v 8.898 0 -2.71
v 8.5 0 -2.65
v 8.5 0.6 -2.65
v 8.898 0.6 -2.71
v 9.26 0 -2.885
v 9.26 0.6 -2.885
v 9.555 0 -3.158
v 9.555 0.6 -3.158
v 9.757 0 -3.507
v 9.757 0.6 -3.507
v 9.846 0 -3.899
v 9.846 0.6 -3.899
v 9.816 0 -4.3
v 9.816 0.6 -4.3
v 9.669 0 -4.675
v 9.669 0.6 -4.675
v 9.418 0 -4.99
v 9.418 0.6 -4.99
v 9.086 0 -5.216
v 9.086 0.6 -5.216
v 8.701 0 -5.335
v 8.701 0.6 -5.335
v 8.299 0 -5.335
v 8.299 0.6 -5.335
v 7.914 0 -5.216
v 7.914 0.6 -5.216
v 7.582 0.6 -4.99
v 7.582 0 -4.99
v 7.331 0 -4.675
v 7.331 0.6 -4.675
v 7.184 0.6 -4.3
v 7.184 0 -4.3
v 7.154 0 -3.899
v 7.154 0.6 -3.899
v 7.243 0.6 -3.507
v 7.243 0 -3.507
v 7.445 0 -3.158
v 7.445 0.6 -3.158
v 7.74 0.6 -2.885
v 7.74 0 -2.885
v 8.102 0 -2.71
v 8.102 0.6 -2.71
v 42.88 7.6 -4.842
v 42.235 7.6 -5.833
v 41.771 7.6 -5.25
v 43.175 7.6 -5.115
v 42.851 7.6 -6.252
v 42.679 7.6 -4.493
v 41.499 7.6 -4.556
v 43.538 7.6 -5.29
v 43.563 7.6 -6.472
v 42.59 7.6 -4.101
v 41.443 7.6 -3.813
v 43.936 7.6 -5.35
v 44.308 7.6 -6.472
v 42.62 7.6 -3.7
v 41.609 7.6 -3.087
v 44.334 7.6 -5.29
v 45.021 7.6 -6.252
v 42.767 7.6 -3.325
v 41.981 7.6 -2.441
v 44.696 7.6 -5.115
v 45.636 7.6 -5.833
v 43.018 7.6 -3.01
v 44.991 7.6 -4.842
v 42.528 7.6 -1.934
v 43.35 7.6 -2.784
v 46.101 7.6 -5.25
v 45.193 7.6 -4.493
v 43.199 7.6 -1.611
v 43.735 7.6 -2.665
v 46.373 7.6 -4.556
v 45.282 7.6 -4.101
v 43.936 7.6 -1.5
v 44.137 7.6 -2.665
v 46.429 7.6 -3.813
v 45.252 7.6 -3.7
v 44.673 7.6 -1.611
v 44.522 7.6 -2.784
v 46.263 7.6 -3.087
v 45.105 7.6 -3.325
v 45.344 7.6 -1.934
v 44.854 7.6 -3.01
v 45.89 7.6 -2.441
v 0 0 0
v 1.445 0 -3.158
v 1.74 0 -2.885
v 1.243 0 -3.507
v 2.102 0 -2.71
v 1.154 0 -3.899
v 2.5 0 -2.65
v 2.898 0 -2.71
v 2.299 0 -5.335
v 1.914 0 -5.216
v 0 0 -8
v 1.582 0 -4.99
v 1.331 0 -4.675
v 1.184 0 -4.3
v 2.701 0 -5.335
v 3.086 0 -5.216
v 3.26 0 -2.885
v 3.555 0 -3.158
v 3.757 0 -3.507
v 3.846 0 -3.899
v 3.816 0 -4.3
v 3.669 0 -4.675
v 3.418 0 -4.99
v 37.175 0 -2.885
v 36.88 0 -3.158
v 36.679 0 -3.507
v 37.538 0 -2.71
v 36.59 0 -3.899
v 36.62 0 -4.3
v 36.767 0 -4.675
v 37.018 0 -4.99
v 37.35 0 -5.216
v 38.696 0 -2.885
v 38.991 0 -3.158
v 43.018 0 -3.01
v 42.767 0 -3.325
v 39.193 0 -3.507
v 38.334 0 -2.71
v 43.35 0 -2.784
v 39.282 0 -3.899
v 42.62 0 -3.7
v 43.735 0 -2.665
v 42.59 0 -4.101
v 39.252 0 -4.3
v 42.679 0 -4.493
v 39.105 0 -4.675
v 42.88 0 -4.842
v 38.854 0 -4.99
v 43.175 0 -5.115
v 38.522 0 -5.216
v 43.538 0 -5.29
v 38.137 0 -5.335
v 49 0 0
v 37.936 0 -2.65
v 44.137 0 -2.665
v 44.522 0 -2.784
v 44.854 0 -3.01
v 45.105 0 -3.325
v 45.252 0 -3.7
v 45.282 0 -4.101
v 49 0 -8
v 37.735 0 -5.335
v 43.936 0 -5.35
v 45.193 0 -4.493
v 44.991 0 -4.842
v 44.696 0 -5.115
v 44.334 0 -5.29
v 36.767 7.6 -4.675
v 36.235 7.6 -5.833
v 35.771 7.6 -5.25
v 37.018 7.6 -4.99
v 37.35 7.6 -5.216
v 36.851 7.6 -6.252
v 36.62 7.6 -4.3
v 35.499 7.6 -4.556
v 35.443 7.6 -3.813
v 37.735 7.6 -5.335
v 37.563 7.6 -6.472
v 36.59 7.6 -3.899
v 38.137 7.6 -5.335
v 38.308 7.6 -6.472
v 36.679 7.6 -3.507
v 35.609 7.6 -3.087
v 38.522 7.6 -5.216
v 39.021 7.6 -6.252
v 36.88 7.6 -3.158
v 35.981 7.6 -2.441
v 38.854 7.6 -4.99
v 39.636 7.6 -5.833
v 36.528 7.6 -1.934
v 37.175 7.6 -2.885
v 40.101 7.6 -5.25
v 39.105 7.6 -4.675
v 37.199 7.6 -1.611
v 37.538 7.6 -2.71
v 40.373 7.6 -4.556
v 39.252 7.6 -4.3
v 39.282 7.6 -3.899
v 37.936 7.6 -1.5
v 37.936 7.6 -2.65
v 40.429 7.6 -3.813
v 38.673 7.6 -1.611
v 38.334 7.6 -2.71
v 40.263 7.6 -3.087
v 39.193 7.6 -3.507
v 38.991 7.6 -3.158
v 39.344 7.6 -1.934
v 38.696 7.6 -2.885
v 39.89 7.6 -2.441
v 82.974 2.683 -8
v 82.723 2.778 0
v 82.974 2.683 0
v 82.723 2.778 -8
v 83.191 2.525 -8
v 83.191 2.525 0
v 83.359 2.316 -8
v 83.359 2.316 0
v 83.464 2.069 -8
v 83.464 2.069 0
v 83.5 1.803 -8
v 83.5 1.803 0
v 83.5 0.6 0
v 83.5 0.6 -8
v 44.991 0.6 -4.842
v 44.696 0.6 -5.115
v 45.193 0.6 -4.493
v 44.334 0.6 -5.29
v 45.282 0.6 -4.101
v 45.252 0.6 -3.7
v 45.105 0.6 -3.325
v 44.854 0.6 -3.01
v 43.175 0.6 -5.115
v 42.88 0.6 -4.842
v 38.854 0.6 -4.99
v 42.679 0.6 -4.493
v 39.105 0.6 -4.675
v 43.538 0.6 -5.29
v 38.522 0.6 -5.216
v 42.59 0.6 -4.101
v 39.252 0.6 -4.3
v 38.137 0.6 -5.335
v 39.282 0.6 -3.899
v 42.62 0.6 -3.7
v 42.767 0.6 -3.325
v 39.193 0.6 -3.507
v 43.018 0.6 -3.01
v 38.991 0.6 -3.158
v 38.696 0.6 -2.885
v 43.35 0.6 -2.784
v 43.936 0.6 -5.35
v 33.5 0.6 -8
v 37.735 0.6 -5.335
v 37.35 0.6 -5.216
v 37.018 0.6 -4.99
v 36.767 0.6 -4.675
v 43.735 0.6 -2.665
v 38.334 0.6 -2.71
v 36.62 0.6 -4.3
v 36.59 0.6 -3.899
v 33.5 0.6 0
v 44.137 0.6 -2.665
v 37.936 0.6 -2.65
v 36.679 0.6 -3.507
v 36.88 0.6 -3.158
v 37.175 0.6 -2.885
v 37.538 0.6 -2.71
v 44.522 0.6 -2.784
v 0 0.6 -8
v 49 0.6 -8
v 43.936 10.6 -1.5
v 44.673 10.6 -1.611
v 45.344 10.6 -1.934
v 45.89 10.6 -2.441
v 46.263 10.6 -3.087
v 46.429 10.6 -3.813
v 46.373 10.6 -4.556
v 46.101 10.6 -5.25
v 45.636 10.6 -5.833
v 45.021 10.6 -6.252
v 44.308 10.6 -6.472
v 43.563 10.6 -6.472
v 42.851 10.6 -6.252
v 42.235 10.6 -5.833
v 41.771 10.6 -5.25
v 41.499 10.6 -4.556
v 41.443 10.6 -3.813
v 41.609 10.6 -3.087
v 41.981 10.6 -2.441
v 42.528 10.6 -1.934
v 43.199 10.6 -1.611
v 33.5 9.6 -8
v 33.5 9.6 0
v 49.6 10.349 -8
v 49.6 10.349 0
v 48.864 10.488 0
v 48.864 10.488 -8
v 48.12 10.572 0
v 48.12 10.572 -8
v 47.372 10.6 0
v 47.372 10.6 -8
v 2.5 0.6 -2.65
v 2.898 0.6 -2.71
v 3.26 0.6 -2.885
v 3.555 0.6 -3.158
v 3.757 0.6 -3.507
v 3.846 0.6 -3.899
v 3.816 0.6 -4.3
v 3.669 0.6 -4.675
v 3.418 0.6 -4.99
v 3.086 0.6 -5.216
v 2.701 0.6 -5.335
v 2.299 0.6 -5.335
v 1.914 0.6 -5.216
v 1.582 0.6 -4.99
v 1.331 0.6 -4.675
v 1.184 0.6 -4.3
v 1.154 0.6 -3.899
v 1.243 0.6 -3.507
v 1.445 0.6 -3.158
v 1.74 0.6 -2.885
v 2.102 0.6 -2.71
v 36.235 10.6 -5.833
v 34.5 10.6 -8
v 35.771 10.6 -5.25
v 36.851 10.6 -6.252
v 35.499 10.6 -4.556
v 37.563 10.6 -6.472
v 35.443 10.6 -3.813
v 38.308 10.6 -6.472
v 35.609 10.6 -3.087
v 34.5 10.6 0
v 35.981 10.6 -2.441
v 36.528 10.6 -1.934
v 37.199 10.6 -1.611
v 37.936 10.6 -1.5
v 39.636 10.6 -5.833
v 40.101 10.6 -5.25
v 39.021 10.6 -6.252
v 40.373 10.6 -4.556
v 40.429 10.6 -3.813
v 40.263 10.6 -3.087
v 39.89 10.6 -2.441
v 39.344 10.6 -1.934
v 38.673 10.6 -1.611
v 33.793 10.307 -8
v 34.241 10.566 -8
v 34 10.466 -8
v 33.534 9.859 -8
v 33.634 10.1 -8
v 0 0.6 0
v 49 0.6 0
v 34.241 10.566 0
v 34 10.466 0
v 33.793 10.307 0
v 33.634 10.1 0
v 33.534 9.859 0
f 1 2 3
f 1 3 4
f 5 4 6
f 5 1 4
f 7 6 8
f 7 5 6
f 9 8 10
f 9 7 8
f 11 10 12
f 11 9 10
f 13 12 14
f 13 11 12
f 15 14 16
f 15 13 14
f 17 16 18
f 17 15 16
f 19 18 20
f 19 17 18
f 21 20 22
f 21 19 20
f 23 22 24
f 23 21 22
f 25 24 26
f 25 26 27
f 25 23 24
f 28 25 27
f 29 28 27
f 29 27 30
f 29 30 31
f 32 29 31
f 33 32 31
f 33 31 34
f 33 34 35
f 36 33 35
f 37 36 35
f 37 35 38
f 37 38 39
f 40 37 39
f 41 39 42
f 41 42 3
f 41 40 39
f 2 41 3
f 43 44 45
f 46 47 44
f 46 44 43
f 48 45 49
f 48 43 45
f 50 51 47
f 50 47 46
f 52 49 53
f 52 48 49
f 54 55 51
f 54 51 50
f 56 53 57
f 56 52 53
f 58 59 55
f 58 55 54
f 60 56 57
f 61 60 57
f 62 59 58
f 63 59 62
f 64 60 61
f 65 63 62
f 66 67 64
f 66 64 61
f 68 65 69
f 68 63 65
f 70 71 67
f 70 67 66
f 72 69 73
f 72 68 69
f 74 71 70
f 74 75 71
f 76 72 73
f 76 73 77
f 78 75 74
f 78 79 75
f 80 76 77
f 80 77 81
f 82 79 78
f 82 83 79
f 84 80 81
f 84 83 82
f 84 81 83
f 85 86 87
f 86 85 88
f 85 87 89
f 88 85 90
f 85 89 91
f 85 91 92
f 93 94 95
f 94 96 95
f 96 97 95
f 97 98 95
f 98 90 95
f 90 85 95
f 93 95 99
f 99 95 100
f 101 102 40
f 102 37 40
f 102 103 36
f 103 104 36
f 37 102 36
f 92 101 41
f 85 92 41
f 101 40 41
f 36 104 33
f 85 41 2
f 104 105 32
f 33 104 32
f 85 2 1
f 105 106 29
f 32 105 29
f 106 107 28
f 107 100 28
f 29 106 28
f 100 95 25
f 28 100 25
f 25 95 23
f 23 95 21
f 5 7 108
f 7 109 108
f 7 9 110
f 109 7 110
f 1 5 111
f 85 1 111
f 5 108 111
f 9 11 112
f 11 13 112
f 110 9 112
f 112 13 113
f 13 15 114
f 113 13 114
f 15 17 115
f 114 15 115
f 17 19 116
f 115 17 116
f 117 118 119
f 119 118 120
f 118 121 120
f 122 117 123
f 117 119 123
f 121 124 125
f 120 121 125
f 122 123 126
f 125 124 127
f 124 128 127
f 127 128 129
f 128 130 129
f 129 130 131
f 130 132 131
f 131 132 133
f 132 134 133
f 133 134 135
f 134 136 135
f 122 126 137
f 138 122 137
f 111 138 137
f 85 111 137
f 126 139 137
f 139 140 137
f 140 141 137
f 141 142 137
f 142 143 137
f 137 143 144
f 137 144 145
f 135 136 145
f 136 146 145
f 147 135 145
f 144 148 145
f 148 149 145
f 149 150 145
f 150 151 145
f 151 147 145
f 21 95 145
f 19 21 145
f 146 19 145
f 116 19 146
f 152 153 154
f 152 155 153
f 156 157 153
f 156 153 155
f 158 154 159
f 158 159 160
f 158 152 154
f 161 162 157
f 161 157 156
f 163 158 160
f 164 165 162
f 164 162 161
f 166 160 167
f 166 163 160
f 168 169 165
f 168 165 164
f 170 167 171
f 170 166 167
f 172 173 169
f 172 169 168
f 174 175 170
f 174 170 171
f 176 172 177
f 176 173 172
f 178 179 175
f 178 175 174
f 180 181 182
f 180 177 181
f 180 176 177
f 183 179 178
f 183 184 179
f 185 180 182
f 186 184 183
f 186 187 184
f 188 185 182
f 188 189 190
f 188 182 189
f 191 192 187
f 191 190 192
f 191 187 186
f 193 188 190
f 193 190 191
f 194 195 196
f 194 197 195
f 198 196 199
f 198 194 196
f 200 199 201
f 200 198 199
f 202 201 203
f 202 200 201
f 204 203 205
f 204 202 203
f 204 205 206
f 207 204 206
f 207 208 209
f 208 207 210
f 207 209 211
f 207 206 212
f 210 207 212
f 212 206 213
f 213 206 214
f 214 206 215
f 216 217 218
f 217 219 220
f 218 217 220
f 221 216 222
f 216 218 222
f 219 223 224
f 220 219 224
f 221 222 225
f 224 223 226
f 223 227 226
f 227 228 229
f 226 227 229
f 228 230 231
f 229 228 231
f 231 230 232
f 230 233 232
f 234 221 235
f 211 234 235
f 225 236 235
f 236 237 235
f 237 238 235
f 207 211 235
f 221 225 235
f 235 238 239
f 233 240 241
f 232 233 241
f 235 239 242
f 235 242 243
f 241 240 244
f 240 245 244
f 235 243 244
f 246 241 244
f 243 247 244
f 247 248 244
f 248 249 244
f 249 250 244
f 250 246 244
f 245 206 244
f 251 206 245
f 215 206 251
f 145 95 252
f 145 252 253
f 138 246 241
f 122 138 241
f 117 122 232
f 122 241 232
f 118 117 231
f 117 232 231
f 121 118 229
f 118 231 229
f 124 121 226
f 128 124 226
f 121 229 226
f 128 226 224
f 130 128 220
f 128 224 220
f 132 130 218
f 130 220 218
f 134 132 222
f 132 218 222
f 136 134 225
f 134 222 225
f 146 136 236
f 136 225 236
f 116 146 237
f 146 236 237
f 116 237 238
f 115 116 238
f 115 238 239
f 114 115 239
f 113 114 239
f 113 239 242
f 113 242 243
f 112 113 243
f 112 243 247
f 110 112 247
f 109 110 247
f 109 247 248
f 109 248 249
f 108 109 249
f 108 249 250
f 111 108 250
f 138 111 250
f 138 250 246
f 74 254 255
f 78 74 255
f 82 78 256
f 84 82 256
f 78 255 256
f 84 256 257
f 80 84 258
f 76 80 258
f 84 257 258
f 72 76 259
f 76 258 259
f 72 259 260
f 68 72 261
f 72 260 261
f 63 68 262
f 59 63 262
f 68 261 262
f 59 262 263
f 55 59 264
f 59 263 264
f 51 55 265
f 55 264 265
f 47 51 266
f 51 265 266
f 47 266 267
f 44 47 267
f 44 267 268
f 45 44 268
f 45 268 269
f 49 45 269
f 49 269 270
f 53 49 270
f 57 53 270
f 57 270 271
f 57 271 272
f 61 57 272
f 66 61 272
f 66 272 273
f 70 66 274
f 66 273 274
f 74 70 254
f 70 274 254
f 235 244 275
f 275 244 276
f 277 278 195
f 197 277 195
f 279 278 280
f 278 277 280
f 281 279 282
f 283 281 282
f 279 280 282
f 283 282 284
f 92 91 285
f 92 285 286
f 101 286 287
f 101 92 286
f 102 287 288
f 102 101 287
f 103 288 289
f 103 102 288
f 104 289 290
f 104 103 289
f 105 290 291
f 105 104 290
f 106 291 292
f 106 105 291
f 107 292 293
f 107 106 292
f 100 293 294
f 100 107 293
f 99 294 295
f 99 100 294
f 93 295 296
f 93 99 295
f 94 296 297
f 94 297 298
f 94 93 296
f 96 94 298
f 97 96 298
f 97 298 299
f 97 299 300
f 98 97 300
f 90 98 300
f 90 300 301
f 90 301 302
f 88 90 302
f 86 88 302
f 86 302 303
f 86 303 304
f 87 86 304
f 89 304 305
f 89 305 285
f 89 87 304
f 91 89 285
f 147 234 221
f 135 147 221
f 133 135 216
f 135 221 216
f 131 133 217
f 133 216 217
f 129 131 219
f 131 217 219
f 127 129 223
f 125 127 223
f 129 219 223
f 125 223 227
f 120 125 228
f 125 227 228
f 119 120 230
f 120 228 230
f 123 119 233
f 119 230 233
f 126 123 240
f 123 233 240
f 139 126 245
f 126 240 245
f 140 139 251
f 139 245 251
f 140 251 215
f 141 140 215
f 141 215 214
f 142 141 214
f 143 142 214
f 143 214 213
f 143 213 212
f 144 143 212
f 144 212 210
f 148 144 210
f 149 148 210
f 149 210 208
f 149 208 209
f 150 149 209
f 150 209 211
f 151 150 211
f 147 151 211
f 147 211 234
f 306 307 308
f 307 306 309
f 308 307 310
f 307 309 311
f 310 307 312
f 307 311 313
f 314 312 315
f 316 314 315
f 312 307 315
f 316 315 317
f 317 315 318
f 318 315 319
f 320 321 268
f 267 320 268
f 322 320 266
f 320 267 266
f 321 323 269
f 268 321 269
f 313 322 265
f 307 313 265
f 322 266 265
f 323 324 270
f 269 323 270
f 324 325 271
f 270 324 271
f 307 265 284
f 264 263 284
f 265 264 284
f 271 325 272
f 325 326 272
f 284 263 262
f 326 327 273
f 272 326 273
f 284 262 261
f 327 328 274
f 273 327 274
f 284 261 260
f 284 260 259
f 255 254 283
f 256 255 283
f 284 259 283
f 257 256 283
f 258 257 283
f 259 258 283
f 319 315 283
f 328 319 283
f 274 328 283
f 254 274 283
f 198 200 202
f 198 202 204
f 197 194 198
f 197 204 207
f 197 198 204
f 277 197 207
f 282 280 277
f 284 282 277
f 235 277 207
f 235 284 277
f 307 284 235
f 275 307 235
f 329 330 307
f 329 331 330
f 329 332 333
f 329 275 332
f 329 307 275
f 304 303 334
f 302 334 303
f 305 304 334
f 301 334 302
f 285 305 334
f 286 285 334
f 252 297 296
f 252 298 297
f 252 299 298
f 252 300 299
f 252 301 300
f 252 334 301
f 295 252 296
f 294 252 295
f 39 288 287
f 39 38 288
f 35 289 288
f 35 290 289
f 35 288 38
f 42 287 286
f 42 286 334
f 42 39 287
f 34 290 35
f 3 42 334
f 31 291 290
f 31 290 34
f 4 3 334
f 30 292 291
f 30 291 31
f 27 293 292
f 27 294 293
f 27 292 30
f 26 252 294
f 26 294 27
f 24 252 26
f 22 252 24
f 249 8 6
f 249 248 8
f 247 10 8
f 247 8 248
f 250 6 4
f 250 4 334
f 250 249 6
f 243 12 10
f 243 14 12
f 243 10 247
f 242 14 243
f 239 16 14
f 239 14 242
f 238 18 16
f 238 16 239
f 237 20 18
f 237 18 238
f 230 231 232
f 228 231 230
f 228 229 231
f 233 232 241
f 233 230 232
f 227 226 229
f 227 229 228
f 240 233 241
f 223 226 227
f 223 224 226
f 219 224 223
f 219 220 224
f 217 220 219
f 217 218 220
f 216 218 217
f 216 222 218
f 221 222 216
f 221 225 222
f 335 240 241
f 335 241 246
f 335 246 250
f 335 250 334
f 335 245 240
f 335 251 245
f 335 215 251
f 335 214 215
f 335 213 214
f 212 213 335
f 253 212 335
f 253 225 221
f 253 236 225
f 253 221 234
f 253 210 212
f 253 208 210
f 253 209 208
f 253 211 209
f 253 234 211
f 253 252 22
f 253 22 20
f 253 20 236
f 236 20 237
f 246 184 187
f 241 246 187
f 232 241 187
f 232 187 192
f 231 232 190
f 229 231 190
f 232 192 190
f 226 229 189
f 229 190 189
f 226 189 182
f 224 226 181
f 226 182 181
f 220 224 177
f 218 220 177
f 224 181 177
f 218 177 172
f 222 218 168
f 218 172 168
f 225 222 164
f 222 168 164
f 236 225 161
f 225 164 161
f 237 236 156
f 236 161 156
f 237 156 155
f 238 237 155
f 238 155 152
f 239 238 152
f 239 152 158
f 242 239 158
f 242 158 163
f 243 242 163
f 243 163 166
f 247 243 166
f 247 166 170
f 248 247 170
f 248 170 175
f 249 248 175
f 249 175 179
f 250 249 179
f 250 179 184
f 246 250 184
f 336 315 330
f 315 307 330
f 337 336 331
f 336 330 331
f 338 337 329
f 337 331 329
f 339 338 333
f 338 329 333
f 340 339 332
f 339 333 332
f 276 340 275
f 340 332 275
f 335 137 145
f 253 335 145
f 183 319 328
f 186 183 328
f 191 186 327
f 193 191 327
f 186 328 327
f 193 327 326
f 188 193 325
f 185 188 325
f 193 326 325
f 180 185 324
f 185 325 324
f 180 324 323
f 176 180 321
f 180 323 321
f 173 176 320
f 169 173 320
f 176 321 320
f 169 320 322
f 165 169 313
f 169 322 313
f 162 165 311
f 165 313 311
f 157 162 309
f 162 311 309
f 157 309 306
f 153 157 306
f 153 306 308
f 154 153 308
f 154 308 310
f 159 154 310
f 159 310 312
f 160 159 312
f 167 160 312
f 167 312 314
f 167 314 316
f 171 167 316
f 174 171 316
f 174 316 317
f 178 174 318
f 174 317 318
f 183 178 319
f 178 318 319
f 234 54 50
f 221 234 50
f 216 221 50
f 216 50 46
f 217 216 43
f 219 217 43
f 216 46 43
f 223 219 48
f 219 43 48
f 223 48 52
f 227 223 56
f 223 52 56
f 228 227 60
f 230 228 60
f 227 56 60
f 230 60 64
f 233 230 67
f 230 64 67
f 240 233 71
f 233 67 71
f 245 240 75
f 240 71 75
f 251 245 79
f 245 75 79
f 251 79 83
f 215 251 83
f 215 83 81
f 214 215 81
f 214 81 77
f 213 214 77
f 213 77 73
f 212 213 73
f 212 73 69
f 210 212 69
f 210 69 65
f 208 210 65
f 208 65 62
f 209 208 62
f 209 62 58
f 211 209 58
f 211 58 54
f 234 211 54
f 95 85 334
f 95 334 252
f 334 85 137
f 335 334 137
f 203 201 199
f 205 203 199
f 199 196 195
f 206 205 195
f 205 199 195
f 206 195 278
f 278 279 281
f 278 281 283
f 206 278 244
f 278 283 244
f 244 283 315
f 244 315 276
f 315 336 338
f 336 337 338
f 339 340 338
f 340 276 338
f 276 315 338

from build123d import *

# Parameters (mm, degrees)
SKETCH_1_W          = 49
SKETCH_1_H          = 8
SKETCH_1_R          = 1.35
EXTRUDE_1_DEPTH     = 0.6
EXTRUDE_2_DEPTH     = 8
FILLET_1_R          = 1
FILLET_2_R          = 10
FILLET_3_R          = 1
SKETCH_3_R          = 1.35
CUT_EXTRUDE_1_DEPTH = 85.549452985
SKETCH_4_R          = 2.5
CUT_EXTRUDE_2_DEPTH = 3


with BuildPart() as part:
    # 草图1 → 凸台-拉伸1 (new body)
    with BuildSketch(Plane(origin=(0, 0, 0), x_dir=(1, 0, 0), z_dir=(0, 1, 0))):
        with Locations((24.5, 4)):
            Rectangle(SKETCH_1_W, SKETCH_1_H)
        with Locations(Location((2.5, 4, 0), (0, 0, 270))):
            Circle(SKETCH_1_R, mode=Mode.SUBTRACT)
        with Locations(Location((8.5, 4, 0), (0, 0, 270))):
            Circle(SKETCH_1_R, mode=Mode.SUBTRACT)
    extrude(amount=EXTRUDE_1_DEPTH)


with BuildPart() as body_2:
    # 草图2 → 凸台-拉伸2 (new body)
    with BuildSketch(Plane.XY):
        Polygon((33.5, 0.6), (33.5, 10.6), (48.5, 10.6), (83.5, 2.6), (83.5, 0.6), align=None)
    extrude(amount=-EXTRUDE_2_DEPTH)

    # 圆角1
    fillet_1_edges = [body_2.edges().sort_by_distance(p)[0] for p in [
        (83.5, 2.6, -4),
    ]]
    fillet(fillet_1_edges, radius=FILLET_1_R)

    # 圆角2
    fillet_2_edges = [body_2.edges().sort_by_distance(p)[0] for p in [
        (48.5, 10.6, -4),
    ]]
    fillet(fillet_2_edges, radius=FILLET_2_R)

    # 圆角3
    fillet_3_edges = [body_2.edges().sort_by_distance(p)[0] for p in [
        (33.5, 10.6, -4),
    ]]
    fillet(fillet_3_edges, radius=FILLET_3_R)


with BuildPart() as cut_extrude_1_tool:
    # 草图3 → 切除-拉伸1 (new, through all)
    with BuildSketch(Plane(origin=(0, 10.6, 0), x_dir=(1, 0, 0), z_dir=(0, 1, 0))):
        with Locations(Location((37.935846161, 4, 0), (0, 0, 270))):
            Circle(SKETCH_3_R)
        with Locations(Location((43.935846161, 4, 0), (0, 0, 90))):
            Circle(SKETCH_3_R)
    extrude(amount=-CUT_EXTRUDE_1_DEPTH)


with BuildPart() as part_1:
    add(part.part)

    # 切除-拉伸1: cut by cut_extrude_1_tool
    add(cut_extrude_1_tool.part, mode=Mode.SUBTRACT)


with BuildPart() as body_2_1:
    add(body_2.part)

    # 切除-拉伸1: cut by cut_extrude_1_tool
    add(cut_extrude_1_tool.part, mode=Mode.SUBTRACT)

    # 草图4 → 切除-拉伸2 (cut)
    with BuildSketch(Plane(origin=(0, 10.6, 0), x_dir=(1, 0, 0), z_dir=(0, 1, 0))):
        with Locations(Location((37.935846161, 4, 0), (0, 0, 270))):
            Circle(SKETCH_4_R)
        with Locations(Location((43.935846161, 4, 0), (0, 0, 270))):
            Circle(SKETCH_4_R)
    extrude(amount=-CUT_EXTRUDE_2_DEPTH, mode=Mode.SUBTRACT)


solid = Compound([part_1.part, body_2_1.part])
